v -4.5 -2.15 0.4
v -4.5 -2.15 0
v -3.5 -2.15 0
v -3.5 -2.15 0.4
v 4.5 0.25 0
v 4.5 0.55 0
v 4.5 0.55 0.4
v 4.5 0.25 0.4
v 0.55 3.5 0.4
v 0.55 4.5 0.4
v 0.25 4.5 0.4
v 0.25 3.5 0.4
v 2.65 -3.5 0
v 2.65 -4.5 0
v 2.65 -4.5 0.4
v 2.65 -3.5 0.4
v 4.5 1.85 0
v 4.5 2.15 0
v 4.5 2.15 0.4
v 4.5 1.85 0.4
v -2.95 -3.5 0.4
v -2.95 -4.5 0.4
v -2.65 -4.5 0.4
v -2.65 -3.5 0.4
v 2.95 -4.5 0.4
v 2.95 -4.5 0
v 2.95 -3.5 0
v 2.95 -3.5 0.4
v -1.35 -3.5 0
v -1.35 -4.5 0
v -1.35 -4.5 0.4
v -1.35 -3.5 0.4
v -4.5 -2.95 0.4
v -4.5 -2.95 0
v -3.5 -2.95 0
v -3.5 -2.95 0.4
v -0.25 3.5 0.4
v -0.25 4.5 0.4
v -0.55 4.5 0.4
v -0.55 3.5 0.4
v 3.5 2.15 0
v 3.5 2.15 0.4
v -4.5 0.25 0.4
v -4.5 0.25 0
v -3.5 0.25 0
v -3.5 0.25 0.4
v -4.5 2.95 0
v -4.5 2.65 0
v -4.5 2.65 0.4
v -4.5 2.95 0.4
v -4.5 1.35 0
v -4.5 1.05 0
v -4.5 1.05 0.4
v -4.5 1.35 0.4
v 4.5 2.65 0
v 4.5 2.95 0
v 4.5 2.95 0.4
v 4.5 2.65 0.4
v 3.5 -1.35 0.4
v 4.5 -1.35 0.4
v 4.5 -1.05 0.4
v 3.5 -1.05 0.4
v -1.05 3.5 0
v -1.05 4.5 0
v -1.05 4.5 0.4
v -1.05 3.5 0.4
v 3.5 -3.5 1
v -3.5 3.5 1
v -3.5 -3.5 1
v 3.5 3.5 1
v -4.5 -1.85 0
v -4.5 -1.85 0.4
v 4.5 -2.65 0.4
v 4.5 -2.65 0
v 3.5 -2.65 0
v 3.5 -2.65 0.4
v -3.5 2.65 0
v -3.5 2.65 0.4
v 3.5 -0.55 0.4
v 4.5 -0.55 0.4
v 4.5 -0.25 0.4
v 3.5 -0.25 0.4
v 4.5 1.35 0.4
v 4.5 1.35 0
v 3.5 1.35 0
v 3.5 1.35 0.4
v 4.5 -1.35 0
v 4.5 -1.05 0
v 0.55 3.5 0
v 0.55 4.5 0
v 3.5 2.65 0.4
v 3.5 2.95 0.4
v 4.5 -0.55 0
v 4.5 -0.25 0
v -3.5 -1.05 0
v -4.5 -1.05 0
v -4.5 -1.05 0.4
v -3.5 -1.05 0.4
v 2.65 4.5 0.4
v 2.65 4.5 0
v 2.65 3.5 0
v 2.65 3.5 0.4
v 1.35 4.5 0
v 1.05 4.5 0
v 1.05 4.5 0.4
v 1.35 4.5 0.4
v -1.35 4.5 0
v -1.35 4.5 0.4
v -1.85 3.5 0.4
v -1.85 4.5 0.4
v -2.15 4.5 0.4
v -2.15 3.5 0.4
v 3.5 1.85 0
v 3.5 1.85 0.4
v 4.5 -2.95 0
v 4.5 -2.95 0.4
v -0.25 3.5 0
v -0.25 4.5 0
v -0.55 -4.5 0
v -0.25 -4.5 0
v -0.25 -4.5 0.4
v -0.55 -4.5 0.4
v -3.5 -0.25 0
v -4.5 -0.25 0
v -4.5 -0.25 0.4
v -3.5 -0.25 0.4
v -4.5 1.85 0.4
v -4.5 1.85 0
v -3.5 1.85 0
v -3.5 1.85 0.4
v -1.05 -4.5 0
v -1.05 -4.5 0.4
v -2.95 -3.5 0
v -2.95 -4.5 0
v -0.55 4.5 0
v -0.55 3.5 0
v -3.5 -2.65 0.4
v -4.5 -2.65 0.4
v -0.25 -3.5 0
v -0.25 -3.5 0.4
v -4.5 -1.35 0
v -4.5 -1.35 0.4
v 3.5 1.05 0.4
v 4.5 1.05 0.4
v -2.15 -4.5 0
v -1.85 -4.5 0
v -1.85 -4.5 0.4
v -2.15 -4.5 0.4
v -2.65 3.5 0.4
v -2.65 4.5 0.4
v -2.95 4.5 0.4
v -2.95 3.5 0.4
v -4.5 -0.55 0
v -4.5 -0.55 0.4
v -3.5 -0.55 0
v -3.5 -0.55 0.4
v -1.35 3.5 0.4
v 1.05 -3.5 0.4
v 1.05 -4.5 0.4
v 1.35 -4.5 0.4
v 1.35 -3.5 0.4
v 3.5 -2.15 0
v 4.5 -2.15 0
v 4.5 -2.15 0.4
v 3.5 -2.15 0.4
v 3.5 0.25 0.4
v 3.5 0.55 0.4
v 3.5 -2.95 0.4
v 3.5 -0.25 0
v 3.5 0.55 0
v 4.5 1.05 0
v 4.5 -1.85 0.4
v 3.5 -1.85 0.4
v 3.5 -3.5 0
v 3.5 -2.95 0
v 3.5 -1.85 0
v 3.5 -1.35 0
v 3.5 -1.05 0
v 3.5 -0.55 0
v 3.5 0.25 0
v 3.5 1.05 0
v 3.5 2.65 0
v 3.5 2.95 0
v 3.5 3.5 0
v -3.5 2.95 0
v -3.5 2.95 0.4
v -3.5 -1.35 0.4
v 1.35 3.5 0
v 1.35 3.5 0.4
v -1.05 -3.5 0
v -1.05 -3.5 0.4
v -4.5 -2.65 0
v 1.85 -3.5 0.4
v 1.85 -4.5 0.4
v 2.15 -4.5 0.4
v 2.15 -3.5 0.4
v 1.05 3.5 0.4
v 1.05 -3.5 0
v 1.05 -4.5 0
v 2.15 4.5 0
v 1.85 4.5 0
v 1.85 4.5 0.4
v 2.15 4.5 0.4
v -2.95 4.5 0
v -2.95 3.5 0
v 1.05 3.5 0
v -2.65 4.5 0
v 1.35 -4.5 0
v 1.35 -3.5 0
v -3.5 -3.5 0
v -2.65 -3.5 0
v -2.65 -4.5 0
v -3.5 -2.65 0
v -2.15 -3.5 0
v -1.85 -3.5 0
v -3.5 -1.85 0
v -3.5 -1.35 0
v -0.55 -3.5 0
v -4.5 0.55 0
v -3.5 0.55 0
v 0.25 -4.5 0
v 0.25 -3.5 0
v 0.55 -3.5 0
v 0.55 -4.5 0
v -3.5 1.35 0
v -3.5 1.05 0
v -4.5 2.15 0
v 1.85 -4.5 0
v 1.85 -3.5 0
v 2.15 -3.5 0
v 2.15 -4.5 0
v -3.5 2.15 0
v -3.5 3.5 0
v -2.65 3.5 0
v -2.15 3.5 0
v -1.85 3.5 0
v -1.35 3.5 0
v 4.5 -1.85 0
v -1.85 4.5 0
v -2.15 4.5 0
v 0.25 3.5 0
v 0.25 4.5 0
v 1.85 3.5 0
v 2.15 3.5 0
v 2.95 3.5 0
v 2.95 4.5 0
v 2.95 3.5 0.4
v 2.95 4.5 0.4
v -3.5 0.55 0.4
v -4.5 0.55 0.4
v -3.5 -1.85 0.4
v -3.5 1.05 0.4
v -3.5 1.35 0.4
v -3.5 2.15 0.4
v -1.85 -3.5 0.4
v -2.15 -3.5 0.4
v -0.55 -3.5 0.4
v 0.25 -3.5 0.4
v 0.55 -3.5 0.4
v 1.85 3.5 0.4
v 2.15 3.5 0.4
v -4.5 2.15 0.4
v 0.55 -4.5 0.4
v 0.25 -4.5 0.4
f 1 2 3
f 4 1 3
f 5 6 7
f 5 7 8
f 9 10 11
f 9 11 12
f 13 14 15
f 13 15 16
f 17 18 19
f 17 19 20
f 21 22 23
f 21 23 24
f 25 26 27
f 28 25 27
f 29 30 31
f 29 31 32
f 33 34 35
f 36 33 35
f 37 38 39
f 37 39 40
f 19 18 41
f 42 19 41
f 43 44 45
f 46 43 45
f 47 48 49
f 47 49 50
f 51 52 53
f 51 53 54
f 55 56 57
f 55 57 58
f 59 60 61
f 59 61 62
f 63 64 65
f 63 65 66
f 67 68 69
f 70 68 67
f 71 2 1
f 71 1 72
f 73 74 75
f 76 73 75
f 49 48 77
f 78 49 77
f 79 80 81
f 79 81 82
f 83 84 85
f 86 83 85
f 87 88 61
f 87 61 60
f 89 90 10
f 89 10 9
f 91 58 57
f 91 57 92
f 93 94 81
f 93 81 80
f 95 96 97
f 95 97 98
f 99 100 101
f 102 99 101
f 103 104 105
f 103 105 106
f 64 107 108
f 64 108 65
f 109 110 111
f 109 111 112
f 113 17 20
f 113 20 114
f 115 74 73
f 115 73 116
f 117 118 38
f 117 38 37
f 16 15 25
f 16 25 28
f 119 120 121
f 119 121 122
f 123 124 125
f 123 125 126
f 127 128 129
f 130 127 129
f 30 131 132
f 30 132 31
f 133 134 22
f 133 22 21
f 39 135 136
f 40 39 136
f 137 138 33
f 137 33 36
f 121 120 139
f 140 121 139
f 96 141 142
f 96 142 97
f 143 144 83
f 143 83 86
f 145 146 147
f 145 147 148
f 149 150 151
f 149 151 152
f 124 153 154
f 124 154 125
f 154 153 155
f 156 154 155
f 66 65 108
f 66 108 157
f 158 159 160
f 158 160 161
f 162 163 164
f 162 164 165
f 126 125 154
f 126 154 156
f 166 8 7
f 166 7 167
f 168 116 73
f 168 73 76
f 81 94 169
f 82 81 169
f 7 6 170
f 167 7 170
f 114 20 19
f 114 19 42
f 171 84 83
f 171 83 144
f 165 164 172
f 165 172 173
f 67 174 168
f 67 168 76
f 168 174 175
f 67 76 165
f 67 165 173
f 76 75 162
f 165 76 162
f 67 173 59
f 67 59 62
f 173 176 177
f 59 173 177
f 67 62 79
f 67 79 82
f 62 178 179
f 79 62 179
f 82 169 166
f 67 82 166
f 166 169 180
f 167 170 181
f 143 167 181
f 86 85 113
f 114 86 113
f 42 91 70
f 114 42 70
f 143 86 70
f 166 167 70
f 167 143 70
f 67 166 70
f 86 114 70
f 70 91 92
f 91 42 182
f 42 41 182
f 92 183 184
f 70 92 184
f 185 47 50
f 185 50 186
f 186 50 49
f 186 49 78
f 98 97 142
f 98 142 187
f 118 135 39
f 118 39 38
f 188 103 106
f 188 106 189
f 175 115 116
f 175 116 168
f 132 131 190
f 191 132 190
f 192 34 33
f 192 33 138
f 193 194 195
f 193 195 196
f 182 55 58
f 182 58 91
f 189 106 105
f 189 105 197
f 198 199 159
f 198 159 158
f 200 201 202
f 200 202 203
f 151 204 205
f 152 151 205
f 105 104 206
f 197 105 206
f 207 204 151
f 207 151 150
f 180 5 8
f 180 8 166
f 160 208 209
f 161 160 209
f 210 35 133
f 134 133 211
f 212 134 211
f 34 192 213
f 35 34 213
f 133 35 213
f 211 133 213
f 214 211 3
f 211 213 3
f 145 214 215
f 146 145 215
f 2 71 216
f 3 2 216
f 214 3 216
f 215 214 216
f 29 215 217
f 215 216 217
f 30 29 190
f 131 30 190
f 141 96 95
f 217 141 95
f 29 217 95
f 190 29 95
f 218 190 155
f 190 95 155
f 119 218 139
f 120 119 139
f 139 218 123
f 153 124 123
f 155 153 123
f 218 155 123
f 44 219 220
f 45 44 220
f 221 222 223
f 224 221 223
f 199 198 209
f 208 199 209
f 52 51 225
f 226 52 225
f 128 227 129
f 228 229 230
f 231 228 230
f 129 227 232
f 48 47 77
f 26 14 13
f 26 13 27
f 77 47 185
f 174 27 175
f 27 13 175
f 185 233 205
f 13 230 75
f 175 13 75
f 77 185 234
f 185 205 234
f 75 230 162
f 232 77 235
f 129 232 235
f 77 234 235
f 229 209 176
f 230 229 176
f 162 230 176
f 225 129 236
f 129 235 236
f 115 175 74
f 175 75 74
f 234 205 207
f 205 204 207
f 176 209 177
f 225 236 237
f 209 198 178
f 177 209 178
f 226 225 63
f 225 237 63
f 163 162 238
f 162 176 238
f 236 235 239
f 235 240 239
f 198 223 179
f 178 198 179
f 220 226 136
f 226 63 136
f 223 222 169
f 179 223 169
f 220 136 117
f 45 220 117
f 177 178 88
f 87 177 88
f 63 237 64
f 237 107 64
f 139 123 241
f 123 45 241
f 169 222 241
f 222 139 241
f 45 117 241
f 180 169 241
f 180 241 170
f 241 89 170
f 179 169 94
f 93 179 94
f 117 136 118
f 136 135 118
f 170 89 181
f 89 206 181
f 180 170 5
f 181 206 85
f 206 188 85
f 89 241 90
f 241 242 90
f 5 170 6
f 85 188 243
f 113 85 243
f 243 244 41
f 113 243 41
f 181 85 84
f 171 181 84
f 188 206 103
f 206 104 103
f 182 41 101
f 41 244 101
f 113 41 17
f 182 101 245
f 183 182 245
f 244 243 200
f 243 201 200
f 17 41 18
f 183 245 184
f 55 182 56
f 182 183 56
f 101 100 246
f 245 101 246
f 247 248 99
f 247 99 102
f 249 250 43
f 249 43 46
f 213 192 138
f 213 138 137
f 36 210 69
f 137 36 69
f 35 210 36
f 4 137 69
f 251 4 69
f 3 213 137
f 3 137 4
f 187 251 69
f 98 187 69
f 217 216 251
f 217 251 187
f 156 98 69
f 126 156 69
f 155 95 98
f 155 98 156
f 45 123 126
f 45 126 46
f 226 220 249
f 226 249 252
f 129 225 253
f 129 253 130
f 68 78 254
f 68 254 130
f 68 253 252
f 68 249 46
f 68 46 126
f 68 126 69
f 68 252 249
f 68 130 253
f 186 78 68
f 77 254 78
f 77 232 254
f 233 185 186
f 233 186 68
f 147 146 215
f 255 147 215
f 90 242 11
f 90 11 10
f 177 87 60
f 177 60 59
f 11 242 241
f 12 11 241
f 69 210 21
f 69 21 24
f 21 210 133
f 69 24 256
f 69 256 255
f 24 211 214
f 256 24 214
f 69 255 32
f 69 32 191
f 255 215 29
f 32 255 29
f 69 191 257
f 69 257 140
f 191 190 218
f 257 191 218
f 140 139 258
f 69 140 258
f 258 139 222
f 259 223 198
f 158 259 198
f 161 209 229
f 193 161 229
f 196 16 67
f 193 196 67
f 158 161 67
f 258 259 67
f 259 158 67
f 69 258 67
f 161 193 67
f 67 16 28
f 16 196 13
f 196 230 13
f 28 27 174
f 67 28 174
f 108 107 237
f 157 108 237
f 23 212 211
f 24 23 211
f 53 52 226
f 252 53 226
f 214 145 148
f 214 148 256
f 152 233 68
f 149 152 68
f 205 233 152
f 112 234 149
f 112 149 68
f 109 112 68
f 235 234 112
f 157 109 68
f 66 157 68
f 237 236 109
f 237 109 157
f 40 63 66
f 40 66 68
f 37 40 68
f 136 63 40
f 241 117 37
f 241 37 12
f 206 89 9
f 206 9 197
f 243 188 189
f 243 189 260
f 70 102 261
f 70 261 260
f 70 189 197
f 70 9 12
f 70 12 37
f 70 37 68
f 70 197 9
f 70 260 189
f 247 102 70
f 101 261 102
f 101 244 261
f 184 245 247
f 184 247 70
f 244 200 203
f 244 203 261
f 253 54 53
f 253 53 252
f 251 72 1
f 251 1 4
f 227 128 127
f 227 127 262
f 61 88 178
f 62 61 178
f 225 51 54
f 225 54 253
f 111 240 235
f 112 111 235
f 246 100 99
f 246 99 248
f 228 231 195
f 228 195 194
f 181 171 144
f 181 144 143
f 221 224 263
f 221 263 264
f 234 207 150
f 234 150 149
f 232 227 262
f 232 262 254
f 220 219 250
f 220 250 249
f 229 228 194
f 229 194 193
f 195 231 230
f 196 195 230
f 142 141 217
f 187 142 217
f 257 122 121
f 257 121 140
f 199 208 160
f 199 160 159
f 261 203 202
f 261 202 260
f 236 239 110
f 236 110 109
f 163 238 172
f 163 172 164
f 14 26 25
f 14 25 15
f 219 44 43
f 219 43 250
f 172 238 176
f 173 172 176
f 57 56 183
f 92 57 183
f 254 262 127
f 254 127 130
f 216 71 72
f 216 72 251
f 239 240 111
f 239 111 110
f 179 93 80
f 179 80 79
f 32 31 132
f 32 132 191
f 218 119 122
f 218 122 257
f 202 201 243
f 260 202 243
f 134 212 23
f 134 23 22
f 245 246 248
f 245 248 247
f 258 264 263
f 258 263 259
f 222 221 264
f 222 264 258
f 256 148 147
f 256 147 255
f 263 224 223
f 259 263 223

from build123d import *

# Parameters (mm, degrees)
F0_W     = 7
F0_H     = 7
F1_DEPTH = 1
F2_W     = 1
F2_H     = 0.3
F3_DEPTH = 0.4
F5_COUNT = 4
F5_ANGLE = 270


with BuildPart() as f1:
    # F0 (on Top) → F1 (new body)
    with BuildSketch(Plane.XY):
        Rectangle(F0_W, F0_H)
    extrude(amount=F1_DEPTH)

    # F2 (on Top) → F3 (join)
    with BuildSketch(Plane.XY):
        with Locations((-4, 2.8)):
            Rectangle(F2_W, F2_H)
        with Locations((-4, 2)):
            Rectangle(F2_W, F2_H)
        with Locations((-4, 1.2)):
            Rectangle(F2_W, F2_H)
        with Locations((-4, -1.2)):
            Rectangle(F2_W, F2_H)
        with Locations((-4, 0.4)):
            Rectangle(F2_W, F2_H)
        with Locations((-4, -0.4)):
            Rectangle(F2_W, F2_H)
        with Locations((-4, -2)):
            Rectangle(F2_W, F2_H)
        with Locations((-4, -2.8)):
            Rectangle(F2_W, F2_H)
    extrude(amount=F3_DEPTH)

    # F5: F1 ×4 about axis
    f5_axis = Axis((0, 0, 4.798143), (0, 0, 1))


with BuildPart() as f1_1:
    add(f1.part)
    for i in range(1, F5_COUNT):
        add(f1.part.rotate(f5_axis, i * F5_ANGLE / (F5_COUNT - 1)))


solid = f1_1.part
